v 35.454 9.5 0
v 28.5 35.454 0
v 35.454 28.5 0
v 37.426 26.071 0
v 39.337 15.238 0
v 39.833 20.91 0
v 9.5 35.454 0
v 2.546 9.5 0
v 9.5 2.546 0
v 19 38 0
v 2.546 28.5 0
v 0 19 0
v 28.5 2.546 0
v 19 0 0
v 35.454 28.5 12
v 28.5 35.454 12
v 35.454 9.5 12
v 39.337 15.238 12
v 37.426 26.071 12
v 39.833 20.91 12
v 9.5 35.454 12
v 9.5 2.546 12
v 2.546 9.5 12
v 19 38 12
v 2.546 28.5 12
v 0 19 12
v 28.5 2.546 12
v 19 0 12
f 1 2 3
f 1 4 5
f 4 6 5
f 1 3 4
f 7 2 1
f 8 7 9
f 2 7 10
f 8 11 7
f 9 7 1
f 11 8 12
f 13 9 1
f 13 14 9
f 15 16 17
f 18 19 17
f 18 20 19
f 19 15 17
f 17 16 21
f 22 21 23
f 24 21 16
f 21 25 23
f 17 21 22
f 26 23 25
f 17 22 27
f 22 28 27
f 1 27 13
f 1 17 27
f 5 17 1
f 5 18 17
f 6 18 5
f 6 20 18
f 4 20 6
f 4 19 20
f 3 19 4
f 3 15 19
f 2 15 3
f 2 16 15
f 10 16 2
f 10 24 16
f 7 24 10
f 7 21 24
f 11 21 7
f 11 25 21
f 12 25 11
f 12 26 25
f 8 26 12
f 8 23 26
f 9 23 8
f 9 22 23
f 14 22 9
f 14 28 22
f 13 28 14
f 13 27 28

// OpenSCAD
$fn = 32;

// ----------------------------------------------------------------------
// Eccentric disc: step, 12 mm thick
// ----------------------------------------------------------------------

// --- parameters (mm) ---
profile_height = 12;      // extrusion height
profile_points = 14;      // points of the closed outline

profile = [[0, 19], [2.546, 9.5], [9.5, 2.546], [19, 0], [28.5, 2.546], [35.454, 9.5], [39.337, 15.238], [39.833, 20.91], [37.426, 26.071], [35.454, 28.5], [28.5, 35.454], [19, 38], [9.5, 35.454], [2.546, 28.5]];  // single closed polygon, 14 points, counter clockwise

// --- the one profile operation ---
linear_extrude(height = profile_height) polygon(points = profile);
